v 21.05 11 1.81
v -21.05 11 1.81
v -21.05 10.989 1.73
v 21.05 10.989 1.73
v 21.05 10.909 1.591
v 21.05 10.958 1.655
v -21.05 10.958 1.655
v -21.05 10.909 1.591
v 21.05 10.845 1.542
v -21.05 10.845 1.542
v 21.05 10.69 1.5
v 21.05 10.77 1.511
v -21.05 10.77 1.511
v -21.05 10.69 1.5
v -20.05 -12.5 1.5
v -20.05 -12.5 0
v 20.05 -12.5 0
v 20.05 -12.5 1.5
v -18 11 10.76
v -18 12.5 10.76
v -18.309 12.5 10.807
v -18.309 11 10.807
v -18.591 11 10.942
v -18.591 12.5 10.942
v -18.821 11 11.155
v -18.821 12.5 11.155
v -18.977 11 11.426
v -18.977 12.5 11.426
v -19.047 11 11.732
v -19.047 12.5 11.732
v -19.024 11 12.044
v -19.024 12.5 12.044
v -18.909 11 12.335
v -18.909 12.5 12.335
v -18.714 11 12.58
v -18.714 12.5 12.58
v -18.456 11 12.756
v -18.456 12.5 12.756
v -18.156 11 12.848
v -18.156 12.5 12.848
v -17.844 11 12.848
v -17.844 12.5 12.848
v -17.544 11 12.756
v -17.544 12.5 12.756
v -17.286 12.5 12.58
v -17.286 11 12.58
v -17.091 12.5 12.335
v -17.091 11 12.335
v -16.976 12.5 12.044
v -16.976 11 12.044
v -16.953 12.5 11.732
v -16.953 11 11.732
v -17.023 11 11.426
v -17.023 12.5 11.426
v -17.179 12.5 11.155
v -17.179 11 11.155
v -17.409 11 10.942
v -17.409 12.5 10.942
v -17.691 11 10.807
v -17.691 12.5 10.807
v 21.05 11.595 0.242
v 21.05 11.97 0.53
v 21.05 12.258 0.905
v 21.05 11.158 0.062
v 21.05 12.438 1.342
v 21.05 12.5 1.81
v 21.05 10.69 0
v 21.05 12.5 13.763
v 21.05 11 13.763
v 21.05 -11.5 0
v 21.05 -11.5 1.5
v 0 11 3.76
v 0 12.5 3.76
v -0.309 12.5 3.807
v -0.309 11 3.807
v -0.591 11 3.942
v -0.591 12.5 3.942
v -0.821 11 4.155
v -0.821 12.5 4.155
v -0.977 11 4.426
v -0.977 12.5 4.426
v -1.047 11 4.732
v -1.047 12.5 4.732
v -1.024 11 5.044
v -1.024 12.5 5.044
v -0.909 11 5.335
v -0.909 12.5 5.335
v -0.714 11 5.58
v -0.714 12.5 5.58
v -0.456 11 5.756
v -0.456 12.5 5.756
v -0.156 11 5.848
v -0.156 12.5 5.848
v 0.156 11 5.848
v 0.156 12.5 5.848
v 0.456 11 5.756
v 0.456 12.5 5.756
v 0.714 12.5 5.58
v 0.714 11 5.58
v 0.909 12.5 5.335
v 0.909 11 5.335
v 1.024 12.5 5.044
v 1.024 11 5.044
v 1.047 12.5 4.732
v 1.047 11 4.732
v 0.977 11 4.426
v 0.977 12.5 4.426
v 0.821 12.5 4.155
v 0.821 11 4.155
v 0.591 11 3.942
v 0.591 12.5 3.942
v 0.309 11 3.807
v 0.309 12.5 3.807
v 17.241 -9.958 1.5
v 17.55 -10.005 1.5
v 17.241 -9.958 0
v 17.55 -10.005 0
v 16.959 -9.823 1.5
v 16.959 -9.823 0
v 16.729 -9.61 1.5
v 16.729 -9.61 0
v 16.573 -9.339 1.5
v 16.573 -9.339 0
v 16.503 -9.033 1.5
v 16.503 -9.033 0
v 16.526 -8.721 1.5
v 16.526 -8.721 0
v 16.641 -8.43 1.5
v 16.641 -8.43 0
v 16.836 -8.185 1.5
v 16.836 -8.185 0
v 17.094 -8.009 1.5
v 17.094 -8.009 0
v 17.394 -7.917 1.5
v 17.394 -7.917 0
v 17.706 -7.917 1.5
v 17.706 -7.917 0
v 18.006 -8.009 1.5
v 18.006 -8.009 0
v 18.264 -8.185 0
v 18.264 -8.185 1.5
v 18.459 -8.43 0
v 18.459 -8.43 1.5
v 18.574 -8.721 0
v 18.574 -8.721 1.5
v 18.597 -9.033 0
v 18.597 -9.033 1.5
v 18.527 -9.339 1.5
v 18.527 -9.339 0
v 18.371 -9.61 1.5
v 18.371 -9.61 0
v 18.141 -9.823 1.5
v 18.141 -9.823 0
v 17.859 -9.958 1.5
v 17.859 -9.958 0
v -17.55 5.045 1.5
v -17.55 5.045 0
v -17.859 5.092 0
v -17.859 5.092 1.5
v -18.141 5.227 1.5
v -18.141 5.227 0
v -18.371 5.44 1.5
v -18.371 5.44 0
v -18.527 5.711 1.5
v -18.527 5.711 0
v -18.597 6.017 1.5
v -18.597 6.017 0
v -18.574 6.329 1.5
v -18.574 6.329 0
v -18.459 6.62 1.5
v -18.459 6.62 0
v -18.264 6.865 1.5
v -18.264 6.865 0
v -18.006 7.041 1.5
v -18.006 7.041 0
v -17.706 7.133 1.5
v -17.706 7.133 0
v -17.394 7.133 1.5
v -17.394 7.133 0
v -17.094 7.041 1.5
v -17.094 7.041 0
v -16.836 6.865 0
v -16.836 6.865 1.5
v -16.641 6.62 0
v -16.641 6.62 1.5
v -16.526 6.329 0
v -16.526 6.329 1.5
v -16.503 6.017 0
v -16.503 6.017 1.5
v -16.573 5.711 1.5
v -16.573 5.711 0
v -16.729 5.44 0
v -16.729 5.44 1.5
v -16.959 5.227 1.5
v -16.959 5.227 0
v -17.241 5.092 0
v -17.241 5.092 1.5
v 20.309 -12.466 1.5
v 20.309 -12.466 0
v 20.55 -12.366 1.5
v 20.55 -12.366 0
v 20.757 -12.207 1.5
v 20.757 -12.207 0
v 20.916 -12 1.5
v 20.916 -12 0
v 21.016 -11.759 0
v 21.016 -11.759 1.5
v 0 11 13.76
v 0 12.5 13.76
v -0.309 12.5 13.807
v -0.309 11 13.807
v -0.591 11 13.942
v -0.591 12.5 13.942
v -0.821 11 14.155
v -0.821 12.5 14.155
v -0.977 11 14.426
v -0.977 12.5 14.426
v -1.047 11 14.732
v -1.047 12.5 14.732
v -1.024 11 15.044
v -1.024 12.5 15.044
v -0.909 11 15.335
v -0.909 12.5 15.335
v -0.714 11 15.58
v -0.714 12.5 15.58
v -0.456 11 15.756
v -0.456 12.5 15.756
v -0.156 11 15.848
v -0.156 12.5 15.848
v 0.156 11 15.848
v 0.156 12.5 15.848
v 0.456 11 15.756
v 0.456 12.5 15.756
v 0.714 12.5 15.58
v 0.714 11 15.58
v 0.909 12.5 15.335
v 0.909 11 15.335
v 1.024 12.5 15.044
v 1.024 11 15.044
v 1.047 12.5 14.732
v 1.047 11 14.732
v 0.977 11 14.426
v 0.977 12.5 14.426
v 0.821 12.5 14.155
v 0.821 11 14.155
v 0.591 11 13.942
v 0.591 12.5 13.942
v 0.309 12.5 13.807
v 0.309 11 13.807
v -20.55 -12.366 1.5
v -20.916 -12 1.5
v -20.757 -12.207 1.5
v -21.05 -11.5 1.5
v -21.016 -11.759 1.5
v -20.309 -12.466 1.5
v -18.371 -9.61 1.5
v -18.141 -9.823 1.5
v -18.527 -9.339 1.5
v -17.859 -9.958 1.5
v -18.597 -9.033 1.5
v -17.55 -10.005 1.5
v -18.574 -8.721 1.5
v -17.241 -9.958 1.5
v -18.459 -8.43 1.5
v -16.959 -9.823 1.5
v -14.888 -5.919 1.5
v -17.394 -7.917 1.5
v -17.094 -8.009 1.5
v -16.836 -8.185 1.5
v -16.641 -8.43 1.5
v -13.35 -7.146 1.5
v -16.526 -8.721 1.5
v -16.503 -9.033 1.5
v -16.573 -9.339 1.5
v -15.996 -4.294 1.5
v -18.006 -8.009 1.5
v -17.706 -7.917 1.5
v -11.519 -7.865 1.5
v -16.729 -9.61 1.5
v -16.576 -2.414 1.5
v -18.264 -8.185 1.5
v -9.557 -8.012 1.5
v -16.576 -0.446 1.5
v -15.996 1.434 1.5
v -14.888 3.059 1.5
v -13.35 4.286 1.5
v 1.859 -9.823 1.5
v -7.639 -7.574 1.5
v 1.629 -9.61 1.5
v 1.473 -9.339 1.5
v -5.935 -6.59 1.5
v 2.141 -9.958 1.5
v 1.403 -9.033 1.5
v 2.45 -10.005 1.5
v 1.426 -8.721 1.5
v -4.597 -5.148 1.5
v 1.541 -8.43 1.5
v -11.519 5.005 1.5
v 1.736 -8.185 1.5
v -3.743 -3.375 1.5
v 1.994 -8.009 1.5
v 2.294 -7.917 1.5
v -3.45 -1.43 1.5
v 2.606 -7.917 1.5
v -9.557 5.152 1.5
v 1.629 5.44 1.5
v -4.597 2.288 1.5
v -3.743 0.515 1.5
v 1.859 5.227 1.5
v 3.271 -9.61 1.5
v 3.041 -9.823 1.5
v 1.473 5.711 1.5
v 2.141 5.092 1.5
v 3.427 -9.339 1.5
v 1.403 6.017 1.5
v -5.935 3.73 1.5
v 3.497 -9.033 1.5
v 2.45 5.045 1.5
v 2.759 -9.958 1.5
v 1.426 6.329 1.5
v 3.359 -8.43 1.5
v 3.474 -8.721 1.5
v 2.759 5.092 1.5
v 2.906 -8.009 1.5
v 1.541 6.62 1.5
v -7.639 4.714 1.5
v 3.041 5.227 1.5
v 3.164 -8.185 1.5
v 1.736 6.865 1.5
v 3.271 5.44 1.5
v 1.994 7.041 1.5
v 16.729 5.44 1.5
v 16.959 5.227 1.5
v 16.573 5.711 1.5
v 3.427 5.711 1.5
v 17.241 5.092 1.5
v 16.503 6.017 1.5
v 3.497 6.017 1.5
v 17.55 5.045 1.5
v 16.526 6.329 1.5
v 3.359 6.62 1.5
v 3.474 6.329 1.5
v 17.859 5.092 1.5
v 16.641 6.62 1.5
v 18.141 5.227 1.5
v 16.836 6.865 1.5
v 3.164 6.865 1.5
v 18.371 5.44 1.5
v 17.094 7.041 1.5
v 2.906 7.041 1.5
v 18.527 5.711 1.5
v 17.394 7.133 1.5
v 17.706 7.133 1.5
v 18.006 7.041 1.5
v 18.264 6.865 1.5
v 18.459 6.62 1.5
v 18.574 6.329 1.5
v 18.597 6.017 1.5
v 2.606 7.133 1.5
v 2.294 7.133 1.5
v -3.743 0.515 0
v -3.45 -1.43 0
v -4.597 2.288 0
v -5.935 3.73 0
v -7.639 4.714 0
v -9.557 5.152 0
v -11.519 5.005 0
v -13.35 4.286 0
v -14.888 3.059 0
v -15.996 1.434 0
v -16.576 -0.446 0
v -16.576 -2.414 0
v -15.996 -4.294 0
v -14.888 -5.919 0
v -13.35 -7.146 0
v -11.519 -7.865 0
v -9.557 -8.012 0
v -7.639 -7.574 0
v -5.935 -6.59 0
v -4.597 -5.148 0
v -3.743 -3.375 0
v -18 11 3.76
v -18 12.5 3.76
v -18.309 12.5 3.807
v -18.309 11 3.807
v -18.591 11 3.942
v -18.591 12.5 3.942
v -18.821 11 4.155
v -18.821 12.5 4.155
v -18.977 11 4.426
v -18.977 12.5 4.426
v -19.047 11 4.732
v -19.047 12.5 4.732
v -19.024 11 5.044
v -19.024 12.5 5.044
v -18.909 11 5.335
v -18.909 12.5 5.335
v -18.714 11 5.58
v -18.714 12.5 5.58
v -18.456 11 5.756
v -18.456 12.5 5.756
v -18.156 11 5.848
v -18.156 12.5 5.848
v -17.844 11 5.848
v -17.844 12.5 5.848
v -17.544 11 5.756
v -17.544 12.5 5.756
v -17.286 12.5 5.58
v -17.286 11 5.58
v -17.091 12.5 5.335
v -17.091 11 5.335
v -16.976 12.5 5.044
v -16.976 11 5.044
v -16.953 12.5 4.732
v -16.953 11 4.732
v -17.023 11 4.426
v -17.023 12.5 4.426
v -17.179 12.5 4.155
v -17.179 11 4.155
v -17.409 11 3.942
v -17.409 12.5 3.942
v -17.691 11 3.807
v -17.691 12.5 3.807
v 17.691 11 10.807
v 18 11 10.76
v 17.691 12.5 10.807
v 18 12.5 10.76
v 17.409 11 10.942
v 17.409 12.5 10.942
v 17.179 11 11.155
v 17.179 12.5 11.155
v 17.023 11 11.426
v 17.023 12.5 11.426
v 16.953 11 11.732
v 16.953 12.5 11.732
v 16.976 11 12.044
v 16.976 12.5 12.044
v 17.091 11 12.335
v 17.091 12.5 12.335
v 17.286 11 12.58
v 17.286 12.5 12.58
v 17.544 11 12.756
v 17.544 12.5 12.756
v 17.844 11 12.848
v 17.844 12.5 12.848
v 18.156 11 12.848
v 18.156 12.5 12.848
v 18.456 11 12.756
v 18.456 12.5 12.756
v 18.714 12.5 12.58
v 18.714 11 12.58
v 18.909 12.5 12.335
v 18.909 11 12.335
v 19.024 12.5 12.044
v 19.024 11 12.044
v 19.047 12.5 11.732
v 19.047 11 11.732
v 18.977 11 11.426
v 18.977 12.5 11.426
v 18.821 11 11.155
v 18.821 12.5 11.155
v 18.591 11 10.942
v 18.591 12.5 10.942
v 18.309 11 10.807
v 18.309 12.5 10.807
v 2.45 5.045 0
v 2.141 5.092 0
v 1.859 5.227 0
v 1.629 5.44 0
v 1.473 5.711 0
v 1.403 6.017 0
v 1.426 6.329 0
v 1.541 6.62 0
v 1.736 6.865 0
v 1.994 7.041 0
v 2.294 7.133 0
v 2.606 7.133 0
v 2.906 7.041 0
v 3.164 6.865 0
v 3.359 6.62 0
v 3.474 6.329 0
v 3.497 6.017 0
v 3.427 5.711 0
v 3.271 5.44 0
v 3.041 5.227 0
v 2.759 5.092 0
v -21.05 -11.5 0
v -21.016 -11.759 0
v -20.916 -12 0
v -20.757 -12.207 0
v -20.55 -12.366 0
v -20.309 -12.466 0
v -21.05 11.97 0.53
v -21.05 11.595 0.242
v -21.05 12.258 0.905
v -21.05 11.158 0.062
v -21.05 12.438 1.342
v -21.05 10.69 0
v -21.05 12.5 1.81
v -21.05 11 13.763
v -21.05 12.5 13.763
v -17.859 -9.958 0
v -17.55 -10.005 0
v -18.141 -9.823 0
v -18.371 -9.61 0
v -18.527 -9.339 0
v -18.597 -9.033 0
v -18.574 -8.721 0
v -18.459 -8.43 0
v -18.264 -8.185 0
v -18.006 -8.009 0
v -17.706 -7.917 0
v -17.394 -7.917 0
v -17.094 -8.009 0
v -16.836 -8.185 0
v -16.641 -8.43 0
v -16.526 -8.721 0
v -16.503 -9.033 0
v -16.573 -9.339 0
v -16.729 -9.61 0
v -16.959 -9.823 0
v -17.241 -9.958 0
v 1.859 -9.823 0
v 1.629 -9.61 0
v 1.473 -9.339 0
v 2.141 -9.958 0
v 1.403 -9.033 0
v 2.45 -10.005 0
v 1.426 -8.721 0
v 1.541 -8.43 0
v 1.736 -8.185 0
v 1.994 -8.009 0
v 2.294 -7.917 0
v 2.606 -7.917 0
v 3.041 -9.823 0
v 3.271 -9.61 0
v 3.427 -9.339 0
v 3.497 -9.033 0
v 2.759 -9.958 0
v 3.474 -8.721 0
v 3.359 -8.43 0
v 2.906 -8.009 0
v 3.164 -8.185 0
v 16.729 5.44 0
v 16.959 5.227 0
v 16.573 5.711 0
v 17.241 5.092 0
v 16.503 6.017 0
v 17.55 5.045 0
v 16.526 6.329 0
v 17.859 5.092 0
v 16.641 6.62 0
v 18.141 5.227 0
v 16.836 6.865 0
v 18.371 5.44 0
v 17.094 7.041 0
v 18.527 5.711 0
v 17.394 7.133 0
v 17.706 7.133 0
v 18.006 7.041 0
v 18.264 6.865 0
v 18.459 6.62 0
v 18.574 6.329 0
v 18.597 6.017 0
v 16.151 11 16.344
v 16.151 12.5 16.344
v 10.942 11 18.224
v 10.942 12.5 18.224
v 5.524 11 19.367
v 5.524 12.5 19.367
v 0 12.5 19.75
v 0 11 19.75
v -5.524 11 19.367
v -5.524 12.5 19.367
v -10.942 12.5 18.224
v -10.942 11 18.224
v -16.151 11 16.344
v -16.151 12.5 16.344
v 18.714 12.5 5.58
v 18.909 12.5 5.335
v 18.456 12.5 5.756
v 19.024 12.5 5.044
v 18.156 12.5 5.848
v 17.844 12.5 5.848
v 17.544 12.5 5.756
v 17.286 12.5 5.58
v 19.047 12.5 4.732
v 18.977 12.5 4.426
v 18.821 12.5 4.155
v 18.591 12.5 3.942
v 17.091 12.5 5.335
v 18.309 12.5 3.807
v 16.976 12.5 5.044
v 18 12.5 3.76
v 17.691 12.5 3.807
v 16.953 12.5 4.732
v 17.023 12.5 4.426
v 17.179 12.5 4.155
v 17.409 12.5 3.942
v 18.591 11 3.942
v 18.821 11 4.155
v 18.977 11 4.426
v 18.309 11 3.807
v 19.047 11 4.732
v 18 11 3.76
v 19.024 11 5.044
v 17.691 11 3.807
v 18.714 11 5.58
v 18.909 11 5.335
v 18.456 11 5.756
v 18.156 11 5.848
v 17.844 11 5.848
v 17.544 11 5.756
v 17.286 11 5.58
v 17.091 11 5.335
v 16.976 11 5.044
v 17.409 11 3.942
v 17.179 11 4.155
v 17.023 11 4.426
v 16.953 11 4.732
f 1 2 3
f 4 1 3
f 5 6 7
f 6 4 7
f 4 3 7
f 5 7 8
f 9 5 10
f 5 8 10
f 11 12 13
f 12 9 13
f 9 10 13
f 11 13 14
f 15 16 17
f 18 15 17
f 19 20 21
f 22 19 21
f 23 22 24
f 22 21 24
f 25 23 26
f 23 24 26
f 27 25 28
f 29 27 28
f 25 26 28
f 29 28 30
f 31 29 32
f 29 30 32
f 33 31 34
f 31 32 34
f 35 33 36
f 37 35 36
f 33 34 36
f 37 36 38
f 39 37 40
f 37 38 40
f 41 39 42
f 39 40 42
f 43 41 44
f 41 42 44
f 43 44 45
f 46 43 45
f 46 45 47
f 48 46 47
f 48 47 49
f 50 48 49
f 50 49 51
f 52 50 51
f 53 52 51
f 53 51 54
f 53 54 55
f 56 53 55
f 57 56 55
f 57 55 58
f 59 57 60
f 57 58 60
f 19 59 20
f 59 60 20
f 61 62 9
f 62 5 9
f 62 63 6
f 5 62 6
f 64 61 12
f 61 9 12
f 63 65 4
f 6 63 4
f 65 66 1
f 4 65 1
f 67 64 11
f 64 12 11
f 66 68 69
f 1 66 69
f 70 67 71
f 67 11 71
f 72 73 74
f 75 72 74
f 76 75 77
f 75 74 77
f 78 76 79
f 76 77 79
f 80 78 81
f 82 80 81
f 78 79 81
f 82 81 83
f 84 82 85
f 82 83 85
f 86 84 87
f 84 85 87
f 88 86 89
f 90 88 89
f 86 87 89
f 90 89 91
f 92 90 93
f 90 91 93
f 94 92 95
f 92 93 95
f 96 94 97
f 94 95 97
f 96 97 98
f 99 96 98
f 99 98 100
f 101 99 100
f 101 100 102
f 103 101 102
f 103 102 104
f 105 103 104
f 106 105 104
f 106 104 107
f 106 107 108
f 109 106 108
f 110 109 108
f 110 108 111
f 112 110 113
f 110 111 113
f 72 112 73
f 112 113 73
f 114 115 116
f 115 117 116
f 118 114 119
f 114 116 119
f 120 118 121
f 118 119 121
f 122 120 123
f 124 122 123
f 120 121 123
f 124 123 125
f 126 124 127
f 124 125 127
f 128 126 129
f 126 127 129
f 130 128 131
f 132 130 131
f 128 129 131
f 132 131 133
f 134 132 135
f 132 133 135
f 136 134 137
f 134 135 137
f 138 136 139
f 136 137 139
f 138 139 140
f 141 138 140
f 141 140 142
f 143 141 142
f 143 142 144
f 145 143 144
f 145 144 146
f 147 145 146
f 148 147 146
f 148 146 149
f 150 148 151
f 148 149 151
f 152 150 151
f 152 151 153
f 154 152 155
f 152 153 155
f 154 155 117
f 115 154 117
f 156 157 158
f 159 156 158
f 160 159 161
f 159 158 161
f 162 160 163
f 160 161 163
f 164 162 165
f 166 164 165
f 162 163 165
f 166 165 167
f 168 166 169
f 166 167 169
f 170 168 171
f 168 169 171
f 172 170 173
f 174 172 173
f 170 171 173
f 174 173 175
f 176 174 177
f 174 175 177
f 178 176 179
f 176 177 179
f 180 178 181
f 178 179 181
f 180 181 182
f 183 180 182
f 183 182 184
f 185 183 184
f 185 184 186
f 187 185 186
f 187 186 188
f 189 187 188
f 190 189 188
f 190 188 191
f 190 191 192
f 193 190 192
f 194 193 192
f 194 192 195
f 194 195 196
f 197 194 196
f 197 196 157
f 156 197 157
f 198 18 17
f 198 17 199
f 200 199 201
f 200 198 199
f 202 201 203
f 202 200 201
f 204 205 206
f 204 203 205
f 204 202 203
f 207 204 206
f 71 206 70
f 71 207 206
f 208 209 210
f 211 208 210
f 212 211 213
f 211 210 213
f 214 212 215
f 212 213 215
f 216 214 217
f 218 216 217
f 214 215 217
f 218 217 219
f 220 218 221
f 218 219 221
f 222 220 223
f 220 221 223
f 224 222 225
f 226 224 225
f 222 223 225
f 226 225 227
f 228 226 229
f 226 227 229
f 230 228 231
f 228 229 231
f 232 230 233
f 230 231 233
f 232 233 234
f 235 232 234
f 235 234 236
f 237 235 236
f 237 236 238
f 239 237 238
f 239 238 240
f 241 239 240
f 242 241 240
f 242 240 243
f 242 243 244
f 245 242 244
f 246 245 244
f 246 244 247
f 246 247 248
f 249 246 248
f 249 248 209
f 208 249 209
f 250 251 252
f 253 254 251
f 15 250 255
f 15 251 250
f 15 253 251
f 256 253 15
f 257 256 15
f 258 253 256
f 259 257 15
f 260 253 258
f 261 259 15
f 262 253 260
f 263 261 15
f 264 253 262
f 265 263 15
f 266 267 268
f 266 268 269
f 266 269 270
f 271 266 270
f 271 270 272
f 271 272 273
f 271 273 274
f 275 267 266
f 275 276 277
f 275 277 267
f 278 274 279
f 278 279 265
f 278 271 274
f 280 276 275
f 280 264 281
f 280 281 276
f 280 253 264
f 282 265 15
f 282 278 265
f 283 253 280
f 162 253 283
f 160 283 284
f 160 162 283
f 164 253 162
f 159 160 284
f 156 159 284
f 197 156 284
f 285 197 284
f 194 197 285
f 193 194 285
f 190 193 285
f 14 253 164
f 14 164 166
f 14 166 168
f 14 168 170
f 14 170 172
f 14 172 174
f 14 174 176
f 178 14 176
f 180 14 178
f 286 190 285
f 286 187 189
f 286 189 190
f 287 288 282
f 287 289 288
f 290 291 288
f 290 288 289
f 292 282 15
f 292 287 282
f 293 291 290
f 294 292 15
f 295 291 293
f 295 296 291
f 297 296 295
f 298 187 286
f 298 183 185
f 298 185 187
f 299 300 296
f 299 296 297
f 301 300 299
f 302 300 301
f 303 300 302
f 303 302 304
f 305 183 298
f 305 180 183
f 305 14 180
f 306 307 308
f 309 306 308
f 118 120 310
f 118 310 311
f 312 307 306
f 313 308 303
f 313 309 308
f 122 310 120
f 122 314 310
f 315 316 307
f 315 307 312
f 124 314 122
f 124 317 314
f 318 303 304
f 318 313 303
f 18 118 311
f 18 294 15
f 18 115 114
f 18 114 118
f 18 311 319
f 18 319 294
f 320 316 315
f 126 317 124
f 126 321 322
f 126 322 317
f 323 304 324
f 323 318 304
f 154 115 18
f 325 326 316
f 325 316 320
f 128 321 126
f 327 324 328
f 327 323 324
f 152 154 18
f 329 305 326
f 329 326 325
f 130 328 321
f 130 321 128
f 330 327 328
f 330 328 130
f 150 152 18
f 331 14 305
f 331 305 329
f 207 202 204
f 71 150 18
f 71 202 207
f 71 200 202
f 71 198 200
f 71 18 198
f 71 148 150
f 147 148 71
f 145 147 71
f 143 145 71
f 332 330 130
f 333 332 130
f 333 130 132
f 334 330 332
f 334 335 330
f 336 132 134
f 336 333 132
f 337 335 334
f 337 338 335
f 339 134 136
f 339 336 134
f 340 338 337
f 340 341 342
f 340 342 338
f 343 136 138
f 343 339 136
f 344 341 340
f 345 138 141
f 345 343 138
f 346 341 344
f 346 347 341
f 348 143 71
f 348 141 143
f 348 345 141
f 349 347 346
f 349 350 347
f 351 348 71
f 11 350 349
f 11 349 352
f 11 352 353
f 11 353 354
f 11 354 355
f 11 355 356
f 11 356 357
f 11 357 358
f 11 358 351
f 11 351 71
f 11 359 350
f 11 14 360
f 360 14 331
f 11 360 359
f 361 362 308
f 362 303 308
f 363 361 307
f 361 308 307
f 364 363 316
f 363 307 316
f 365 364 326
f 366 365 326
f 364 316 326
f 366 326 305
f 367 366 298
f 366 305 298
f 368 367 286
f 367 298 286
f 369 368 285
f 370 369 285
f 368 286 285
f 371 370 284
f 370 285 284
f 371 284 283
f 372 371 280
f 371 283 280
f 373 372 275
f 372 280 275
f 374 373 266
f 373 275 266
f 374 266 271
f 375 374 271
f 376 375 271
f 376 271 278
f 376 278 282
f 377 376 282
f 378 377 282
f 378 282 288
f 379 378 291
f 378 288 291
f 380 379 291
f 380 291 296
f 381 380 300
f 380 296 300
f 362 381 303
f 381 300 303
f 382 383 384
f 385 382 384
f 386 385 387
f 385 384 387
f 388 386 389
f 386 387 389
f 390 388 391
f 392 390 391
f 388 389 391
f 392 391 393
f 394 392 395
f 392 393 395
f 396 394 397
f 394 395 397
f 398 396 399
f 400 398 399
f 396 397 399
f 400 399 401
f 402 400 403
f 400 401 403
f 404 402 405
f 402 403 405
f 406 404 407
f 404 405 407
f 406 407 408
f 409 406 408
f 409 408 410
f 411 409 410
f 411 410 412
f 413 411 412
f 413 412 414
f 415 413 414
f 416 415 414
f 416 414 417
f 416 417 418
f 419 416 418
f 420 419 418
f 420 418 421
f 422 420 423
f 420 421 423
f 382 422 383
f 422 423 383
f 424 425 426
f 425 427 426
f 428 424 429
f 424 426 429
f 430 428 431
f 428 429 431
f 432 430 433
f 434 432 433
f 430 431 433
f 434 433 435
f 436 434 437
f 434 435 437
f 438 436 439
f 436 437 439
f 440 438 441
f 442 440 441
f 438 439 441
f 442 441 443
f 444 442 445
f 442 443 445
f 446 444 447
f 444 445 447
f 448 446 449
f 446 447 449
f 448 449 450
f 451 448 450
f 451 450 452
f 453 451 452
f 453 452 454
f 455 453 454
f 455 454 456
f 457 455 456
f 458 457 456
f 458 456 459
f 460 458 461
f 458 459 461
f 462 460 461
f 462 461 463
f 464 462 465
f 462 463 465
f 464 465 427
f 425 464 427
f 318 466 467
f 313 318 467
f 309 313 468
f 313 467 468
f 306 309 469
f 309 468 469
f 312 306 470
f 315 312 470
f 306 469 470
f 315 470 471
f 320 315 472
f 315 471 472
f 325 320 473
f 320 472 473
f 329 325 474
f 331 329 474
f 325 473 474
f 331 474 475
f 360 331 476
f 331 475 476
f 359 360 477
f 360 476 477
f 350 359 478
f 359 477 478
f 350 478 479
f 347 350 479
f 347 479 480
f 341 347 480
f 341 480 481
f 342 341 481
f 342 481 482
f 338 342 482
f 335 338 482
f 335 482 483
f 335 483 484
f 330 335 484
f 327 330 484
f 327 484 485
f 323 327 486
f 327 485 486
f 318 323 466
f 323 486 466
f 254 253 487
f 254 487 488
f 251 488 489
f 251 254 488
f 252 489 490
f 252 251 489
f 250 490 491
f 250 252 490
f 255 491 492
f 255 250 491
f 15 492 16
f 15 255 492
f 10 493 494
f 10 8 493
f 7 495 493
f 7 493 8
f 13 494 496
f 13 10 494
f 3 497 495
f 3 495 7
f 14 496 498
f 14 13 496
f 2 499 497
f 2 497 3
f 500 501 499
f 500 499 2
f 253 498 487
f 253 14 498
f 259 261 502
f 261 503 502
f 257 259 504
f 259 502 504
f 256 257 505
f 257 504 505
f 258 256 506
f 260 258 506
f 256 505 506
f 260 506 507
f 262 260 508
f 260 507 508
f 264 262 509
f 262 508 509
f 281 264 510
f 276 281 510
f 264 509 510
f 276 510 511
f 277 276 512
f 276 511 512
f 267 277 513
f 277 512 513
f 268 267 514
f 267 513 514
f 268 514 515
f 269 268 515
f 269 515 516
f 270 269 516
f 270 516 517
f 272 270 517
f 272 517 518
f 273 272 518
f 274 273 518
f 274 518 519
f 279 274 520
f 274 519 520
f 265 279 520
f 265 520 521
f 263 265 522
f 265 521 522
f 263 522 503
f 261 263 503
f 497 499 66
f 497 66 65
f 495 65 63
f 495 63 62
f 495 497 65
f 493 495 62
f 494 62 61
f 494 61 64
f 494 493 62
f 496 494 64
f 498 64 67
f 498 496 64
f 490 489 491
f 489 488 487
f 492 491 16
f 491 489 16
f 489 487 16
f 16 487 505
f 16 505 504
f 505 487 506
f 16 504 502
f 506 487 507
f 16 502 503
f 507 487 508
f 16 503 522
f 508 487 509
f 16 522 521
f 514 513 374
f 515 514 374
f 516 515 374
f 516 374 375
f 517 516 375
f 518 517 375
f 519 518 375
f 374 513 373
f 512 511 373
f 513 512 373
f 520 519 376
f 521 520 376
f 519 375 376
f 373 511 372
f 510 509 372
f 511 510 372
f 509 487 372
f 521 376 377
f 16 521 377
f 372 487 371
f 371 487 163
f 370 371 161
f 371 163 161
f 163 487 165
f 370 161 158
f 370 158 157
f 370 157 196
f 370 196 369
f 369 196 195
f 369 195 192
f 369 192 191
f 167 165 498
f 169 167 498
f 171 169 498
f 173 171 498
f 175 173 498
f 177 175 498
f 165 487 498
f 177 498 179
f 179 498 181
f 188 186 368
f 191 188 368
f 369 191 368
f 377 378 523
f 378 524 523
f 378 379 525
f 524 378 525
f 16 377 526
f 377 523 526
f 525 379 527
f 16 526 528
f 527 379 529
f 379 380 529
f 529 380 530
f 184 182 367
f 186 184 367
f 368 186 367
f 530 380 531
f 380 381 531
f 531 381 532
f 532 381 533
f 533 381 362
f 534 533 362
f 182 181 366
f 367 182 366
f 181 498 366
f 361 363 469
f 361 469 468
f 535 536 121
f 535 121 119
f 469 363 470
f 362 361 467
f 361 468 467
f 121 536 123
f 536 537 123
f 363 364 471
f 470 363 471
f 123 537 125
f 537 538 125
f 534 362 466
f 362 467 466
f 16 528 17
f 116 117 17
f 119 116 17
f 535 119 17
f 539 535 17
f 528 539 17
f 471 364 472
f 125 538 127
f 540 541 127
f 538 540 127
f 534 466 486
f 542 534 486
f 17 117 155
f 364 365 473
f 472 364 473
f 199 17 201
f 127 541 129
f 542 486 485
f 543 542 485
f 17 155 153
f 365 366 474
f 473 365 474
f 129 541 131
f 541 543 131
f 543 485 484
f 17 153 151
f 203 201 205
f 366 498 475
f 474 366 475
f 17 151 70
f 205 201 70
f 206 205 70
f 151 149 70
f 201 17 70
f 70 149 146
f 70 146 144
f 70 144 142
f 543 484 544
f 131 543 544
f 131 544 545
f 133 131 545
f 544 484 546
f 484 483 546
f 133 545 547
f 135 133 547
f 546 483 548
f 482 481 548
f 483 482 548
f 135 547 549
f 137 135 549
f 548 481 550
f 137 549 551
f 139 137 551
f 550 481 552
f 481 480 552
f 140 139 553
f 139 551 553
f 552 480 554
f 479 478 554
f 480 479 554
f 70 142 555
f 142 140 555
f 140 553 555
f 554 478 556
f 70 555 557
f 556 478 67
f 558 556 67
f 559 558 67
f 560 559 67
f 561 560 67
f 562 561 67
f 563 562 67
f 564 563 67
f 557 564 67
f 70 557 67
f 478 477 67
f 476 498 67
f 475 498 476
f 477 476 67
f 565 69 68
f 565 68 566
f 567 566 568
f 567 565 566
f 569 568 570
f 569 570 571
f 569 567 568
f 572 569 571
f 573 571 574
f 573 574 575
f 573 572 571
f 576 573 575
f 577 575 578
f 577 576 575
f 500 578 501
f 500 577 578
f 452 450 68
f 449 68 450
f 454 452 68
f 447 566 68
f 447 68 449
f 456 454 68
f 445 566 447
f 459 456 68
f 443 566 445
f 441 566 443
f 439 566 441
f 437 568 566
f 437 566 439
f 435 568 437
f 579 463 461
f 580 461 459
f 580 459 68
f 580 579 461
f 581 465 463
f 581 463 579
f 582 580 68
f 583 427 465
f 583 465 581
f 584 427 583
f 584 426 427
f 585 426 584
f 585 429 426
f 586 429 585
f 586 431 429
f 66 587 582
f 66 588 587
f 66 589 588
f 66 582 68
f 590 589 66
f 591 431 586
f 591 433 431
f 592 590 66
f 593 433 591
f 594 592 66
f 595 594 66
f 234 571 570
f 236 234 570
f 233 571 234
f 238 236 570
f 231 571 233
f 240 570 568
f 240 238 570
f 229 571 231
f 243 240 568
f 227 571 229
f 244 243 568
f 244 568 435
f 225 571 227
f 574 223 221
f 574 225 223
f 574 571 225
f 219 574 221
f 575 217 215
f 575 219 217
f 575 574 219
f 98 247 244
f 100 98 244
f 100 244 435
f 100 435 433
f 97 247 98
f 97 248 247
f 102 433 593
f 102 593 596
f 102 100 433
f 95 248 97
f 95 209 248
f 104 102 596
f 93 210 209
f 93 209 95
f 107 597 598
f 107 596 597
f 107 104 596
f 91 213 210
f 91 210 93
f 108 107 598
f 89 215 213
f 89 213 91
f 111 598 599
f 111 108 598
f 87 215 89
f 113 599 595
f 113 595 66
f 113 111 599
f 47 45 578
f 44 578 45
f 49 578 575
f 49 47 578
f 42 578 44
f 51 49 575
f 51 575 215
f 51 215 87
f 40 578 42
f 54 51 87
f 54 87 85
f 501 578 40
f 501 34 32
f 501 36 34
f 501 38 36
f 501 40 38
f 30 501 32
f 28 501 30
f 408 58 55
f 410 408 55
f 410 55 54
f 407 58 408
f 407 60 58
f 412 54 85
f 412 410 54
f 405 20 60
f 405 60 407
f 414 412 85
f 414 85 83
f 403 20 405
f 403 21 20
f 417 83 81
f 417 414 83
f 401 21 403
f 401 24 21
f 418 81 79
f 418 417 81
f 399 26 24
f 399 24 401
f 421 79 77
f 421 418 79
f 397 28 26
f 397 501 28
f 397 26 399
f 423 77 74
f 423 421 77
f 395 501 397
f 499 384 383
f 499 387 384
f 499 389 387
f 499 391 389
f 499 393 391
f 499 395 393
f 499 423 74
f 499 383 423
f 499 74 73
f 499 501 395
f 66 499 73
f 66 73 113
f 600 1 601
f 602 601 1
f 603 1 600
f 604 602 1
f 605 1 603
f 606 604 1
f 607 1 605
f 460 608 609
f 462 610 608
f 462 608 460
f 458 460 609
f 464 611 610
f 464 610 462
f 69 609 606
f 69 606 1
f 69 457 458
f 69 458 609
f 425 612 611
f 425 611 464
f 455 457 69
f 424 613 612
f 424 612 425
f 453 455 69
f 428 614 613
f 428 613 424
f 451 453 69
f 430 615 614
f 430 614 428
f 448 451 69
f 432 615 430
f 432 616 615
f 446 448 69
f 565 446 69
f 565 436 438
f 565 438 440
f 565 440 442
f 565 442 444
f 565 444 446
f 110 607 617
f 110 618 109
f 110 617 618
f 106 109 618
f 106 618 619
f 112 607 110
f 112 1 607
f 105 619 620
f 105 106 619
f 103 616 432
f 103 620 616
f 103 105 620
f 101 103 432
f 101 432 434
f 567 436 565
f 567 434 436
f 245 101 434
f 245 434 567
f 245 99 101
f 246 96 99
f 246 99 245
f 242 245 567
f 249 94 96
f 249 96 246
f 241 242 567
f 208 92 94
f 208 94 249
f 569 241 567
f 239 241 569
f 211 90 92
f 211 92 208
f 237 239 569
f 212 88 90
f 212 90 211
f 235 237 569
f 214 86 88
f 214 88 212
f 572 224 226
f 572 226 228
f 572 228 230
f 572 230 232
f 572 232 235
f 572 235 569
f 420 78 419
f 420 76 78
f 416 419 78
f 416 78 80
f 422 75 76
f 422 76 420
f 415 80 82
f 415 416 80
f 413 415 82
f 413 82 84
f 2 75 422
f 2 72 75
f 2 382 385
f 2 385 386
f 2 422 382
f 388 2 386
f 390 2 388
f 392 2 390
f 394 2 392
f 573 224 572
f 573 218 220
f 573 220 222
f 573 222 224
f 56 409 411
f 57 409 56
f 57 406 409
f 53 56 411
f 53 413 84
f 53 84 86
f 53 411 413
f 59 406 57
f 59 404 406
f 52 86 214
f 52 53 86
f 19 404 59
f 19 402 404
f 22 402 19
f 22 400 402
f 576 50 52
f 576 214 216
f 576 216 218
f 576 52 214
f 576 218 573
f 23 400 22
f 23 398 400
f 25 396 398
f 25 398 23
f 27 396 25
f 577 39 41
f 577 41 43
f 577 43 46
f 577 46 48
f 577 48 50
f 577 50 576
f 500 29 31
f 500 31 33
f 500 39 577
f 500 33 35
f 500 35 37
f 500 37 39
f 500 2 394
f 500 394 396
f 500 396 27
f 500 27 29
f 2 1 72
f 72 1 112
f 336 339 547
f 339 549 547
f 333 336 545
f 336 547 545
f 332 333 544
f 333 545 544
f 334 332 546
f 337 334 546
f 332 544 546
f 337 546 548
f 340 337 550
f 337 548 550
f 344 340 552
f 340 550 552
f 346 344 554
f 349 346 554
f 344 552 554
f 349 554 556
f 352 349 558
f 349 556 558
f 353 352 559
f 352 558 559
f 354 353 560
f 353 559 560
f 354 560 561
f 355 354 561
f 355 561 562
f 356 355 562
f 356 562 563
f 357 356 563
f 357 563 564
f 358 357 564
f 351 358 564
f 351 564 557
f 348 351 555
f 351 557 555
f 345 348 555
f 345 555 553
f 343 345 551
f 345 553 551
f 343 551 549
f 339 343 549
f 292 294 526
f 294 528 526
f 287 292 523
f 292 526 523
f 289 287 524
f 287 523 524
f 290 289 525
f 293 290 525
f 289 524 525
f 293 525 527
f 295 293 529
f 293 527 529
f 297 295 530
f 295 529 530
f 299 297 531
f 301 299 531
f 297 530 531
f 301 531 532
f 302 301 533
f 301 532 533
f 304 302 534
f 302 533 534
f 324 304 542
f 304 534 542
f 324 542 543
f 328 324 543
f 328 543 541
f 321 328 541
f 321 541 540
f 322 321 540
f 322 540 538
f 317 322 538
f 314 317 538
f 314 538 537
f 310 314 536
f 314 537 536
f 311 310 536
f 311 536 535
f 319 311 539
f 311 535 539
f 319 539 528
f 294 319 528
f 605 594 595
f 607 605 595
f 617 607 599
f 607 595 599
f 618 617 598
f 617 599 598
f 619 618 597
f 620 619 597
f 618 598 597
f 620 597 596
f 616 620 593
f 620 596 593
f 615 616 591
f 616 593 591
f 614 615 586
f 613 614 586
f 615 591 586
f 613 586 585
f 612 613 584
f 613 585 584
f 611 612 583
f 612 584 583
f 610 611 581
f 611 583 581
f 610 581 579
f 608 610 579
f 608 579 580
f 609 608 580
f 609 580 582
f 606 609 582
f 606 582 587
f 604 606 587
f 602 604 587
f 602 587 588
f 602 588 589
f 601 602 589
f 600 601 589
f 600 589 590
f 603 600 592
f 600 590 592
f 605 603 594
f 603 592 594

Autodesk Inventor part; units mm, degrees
ref_plane "YZ Plane" through (0, 0, 0) normal (1, 0, 0) x (0, 1, 0)
ref_plane "XZ Plane" through (0, 0, 0) normal (0, 1, 0) x (-1, 0, 0)
ref_plane "XY Plane" through (0, 0, 0) normal (0, 0, 1) x (1, 0, 0)
sketch "Sketch1" plane through (0, 0, 0) normal (0, 0, 1) x (1, 0, 0)
  line L0 (-21.05, -12.5) -> (21.05, -12.5)
  line L1 (21.05, -12.5) -> (21.05, 12.5)
  line L2 (21.05, 12.5) -> (-21.05, 12.5)
  line L3 (-21.05, 12.5) -> (-21.05, -12.5)
  line L4 (-21.05, -12.5) -> (21.05, 12.5) construction
  line L5 (21.05, -12.5) -> (-21.05, 12.5) construction
  point P0 (0, 0)
  dimension "d0" = 42.1
  dimension "d1" = 25
extrude "Plate1" add sketch "Sketch1" along normal blind 1.5
sketch "Sketch4" plane through (-21.05, 11, 0) normal (0, 1, 0) x (-1, 0, 0)
  line L0 (-42.1, 0) -> (0, 0)
  line L1 (0, 0) -> (0, 25)
  line L2 (0, 25) -> (-42.1, 25)
  line L3 (-42.1, 25) -> (-42.1, 0)
edge flange "Flange1" height 25 angle 90 thickness 1.5 bend radius 0.31 thickness toward (0, 1, 0) relief tear relief width 1.5 relief depth 0.75 edges at (0, 12.5, 1.5) wall of the first edge with corners at (21.05, 11, 0) (-21.05, 11, 0) (-21.05, 11, 25) (21.05, 11, 25)
bend "Bend1"
corner "Corner1"
sketch "Sketch5" plane through (-21.05, 11, 25) normal (0, -1, 0) x (1, 0, 0)
  circle A0 centre (21.05, -45.25) radius 40 projected
  circle A1 centre (21.05, -45.25) radius 53
  point P0 (21.05, -25)
  dimension "d23" = 13
extrude "Cut1" cut sketch "Sketch5" against normal blind 1.5
fillet "Corner Round1" radius 1 2 edges at (21.05, -12.5, 0.75) (-21.05, -12.5, 0.75)
sketch "Sketch6" plane through (-21.05, 11, 1.81) normal (0, -1, 0) x (1, 0, 0)
  line L0 (0, 0) -> (42.1, 0) projected
  arc A0 (42.1, 11.9532) -> (0, 11.9532) centre (21.05, -22.06) ccw projected
  line L1 (21.05, 0) -> (21.05, 17.94) construction
  point P0 (21.05, -1.81)
  point P1 (3.05, 3)
  point P2 (3.05, 10)
  point P3 (21.05, 13)
  point P4 (21.05, 3)
  point P5 (39.05, 3)
  point P6 (39.05, 10)
  dimension "d27" = 10
  dimension "d28" = 3
  dimension "d29" = 18
  dimension "d30" = 7
hole "Hole2" at (-18, 11, 4.81) at (-18, 11, 11.81) at (0, 11, 14.81) at (0, 11, 4.81) at (18, 11, 4.81) at (18, 11, 11.81) direction (0, 1, 0) diameter 2.1 end through all
sketch "Sketch7" plane through (0, 0, 1.5) normal (0, 0, 1) x (1, 0, 0)
  circle A0 centre (17.55, -8.955) radius 0.7835 projected
  circle A1 centre (2.45, -8.955) radius 0.7835 projected
  circle A2 centre (2.45, 6.095) radius 0.7835 projected
  circle A3 centre (17.55, 6.095) radius 0.7835 projected
  circle A4 centre (-17.55, 6.095) radius 0.7835 projected
  circle A5 centre (-17.55, -8.955) radius 0.7835 projected
  point P0 (0, 0)
hole "Hole3" at (17.55, 6.095, 1.5) at (17.55, -8.955, 1.5) at (2.45, -8.955, 1.5) at (2.45, 6.095, 1.5) at (-17.55, 6.095, 1.5) at (-17.55, -8.955, 1.5) direction (0, 0, -1) diameter 2.1 end through all
sketch "Sketch8" plane through (0, 0, 1.5) normal (0, 0, 1) x (1, 0, 0)
  circle A0 centre (-10.05, -1.43) radius 2.925 projected
  circle A1 centre (-10.05, -1.43) radius 6.6
  point P0 (0, 0)
  dimension "d45" = 13.2
extrude "Cut2" cut sketch "Sketch8" against normal blind 1.5 contours A0 | A1
equation "\"d24\" = Thickness"
equation "\"d43\" = Thickness"
equation "\"d46\" = Thickness"
equation "\"d2\" = Thickness"
equation "\"d13\" = BendReliefWidth"
equation "\"d14\" = BendReliefDepth"
equation "\"d15\" = MinimumRemnant"
equation "\"d16\" = TransitionRadius"
equation "\"d19\" = BendRadius"
equation "\"d20\" = CornerReliefSize"
equation "\"d21\" = GapSize"
equation "\"d22\" = JacobiRadiusSize"
equation "\"BendReliefWidth\" = Thickness"
equation "\"BendReliefDepth\" = 0.5 * Thickness"
equation "\"CornerReliefSize\" = 4 * Thickness"
equation "\"MinimumRemnant\" = 2 * Thickness"
equation "\"TransitionRadius\" = BendRadius"
equation "\"JacobiRadiusSize\" = BendRadius"
equation "\"GapSize\" = Thickness"
equation "\"Thickness\" = 1.5"
equation "\"BendRadius\" = 0.31"
properties part number "axis_2_bottom_L_frame(bottom)" material "Aluminum 6061-AHC"
